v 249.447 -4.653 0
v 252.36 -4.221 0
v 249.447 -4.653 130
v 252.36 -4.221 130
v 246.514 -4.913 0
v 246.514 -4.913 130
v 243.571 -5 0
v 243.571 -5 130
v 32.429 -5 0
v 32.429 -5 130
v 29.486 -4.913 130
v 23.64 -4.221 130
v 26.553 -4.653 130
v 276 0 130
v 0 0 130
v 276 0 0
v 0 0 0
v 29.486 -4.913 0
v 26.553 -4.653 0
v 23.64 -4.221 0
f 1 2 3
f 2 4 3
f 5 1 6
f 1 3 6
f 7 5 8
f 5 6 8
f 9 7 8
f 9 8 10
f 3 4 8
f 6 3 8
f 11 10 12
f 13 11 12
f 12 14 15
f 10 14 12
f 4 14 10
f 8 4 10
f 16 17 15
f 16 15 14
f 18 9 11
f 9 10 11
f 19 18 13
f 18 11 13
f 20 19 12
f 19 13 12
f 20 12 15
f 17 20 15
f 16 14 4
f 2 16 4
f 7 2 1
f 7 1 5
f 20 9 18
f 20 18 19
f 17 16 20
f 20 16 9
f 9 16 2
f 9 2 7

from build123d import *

# Parameters (mm, degrees)
BOSS_EXTRUDE1_DEPTH = 130
FILLET1_R           = 50


with BuildPart() as part:
    # Sketch1 → Boss-Extrude1 (new body)
    with BuildSketch(Plane.XY):
        Polygon((0, 0), (276, 0), (248, -5), (28, -5), align=None)
    extrude(amount=BOSS_EXTRUDE1_DEPTH)

    # Fillet1
    fillet1_edges = [part.edges().sort_by_distance(p)[0] for p in [
        (248, -5, 65),
        (28, -5, 65),
    ]]
    fillet(fillet1_edges, radius=FILLET1_R)


solid = part.part
